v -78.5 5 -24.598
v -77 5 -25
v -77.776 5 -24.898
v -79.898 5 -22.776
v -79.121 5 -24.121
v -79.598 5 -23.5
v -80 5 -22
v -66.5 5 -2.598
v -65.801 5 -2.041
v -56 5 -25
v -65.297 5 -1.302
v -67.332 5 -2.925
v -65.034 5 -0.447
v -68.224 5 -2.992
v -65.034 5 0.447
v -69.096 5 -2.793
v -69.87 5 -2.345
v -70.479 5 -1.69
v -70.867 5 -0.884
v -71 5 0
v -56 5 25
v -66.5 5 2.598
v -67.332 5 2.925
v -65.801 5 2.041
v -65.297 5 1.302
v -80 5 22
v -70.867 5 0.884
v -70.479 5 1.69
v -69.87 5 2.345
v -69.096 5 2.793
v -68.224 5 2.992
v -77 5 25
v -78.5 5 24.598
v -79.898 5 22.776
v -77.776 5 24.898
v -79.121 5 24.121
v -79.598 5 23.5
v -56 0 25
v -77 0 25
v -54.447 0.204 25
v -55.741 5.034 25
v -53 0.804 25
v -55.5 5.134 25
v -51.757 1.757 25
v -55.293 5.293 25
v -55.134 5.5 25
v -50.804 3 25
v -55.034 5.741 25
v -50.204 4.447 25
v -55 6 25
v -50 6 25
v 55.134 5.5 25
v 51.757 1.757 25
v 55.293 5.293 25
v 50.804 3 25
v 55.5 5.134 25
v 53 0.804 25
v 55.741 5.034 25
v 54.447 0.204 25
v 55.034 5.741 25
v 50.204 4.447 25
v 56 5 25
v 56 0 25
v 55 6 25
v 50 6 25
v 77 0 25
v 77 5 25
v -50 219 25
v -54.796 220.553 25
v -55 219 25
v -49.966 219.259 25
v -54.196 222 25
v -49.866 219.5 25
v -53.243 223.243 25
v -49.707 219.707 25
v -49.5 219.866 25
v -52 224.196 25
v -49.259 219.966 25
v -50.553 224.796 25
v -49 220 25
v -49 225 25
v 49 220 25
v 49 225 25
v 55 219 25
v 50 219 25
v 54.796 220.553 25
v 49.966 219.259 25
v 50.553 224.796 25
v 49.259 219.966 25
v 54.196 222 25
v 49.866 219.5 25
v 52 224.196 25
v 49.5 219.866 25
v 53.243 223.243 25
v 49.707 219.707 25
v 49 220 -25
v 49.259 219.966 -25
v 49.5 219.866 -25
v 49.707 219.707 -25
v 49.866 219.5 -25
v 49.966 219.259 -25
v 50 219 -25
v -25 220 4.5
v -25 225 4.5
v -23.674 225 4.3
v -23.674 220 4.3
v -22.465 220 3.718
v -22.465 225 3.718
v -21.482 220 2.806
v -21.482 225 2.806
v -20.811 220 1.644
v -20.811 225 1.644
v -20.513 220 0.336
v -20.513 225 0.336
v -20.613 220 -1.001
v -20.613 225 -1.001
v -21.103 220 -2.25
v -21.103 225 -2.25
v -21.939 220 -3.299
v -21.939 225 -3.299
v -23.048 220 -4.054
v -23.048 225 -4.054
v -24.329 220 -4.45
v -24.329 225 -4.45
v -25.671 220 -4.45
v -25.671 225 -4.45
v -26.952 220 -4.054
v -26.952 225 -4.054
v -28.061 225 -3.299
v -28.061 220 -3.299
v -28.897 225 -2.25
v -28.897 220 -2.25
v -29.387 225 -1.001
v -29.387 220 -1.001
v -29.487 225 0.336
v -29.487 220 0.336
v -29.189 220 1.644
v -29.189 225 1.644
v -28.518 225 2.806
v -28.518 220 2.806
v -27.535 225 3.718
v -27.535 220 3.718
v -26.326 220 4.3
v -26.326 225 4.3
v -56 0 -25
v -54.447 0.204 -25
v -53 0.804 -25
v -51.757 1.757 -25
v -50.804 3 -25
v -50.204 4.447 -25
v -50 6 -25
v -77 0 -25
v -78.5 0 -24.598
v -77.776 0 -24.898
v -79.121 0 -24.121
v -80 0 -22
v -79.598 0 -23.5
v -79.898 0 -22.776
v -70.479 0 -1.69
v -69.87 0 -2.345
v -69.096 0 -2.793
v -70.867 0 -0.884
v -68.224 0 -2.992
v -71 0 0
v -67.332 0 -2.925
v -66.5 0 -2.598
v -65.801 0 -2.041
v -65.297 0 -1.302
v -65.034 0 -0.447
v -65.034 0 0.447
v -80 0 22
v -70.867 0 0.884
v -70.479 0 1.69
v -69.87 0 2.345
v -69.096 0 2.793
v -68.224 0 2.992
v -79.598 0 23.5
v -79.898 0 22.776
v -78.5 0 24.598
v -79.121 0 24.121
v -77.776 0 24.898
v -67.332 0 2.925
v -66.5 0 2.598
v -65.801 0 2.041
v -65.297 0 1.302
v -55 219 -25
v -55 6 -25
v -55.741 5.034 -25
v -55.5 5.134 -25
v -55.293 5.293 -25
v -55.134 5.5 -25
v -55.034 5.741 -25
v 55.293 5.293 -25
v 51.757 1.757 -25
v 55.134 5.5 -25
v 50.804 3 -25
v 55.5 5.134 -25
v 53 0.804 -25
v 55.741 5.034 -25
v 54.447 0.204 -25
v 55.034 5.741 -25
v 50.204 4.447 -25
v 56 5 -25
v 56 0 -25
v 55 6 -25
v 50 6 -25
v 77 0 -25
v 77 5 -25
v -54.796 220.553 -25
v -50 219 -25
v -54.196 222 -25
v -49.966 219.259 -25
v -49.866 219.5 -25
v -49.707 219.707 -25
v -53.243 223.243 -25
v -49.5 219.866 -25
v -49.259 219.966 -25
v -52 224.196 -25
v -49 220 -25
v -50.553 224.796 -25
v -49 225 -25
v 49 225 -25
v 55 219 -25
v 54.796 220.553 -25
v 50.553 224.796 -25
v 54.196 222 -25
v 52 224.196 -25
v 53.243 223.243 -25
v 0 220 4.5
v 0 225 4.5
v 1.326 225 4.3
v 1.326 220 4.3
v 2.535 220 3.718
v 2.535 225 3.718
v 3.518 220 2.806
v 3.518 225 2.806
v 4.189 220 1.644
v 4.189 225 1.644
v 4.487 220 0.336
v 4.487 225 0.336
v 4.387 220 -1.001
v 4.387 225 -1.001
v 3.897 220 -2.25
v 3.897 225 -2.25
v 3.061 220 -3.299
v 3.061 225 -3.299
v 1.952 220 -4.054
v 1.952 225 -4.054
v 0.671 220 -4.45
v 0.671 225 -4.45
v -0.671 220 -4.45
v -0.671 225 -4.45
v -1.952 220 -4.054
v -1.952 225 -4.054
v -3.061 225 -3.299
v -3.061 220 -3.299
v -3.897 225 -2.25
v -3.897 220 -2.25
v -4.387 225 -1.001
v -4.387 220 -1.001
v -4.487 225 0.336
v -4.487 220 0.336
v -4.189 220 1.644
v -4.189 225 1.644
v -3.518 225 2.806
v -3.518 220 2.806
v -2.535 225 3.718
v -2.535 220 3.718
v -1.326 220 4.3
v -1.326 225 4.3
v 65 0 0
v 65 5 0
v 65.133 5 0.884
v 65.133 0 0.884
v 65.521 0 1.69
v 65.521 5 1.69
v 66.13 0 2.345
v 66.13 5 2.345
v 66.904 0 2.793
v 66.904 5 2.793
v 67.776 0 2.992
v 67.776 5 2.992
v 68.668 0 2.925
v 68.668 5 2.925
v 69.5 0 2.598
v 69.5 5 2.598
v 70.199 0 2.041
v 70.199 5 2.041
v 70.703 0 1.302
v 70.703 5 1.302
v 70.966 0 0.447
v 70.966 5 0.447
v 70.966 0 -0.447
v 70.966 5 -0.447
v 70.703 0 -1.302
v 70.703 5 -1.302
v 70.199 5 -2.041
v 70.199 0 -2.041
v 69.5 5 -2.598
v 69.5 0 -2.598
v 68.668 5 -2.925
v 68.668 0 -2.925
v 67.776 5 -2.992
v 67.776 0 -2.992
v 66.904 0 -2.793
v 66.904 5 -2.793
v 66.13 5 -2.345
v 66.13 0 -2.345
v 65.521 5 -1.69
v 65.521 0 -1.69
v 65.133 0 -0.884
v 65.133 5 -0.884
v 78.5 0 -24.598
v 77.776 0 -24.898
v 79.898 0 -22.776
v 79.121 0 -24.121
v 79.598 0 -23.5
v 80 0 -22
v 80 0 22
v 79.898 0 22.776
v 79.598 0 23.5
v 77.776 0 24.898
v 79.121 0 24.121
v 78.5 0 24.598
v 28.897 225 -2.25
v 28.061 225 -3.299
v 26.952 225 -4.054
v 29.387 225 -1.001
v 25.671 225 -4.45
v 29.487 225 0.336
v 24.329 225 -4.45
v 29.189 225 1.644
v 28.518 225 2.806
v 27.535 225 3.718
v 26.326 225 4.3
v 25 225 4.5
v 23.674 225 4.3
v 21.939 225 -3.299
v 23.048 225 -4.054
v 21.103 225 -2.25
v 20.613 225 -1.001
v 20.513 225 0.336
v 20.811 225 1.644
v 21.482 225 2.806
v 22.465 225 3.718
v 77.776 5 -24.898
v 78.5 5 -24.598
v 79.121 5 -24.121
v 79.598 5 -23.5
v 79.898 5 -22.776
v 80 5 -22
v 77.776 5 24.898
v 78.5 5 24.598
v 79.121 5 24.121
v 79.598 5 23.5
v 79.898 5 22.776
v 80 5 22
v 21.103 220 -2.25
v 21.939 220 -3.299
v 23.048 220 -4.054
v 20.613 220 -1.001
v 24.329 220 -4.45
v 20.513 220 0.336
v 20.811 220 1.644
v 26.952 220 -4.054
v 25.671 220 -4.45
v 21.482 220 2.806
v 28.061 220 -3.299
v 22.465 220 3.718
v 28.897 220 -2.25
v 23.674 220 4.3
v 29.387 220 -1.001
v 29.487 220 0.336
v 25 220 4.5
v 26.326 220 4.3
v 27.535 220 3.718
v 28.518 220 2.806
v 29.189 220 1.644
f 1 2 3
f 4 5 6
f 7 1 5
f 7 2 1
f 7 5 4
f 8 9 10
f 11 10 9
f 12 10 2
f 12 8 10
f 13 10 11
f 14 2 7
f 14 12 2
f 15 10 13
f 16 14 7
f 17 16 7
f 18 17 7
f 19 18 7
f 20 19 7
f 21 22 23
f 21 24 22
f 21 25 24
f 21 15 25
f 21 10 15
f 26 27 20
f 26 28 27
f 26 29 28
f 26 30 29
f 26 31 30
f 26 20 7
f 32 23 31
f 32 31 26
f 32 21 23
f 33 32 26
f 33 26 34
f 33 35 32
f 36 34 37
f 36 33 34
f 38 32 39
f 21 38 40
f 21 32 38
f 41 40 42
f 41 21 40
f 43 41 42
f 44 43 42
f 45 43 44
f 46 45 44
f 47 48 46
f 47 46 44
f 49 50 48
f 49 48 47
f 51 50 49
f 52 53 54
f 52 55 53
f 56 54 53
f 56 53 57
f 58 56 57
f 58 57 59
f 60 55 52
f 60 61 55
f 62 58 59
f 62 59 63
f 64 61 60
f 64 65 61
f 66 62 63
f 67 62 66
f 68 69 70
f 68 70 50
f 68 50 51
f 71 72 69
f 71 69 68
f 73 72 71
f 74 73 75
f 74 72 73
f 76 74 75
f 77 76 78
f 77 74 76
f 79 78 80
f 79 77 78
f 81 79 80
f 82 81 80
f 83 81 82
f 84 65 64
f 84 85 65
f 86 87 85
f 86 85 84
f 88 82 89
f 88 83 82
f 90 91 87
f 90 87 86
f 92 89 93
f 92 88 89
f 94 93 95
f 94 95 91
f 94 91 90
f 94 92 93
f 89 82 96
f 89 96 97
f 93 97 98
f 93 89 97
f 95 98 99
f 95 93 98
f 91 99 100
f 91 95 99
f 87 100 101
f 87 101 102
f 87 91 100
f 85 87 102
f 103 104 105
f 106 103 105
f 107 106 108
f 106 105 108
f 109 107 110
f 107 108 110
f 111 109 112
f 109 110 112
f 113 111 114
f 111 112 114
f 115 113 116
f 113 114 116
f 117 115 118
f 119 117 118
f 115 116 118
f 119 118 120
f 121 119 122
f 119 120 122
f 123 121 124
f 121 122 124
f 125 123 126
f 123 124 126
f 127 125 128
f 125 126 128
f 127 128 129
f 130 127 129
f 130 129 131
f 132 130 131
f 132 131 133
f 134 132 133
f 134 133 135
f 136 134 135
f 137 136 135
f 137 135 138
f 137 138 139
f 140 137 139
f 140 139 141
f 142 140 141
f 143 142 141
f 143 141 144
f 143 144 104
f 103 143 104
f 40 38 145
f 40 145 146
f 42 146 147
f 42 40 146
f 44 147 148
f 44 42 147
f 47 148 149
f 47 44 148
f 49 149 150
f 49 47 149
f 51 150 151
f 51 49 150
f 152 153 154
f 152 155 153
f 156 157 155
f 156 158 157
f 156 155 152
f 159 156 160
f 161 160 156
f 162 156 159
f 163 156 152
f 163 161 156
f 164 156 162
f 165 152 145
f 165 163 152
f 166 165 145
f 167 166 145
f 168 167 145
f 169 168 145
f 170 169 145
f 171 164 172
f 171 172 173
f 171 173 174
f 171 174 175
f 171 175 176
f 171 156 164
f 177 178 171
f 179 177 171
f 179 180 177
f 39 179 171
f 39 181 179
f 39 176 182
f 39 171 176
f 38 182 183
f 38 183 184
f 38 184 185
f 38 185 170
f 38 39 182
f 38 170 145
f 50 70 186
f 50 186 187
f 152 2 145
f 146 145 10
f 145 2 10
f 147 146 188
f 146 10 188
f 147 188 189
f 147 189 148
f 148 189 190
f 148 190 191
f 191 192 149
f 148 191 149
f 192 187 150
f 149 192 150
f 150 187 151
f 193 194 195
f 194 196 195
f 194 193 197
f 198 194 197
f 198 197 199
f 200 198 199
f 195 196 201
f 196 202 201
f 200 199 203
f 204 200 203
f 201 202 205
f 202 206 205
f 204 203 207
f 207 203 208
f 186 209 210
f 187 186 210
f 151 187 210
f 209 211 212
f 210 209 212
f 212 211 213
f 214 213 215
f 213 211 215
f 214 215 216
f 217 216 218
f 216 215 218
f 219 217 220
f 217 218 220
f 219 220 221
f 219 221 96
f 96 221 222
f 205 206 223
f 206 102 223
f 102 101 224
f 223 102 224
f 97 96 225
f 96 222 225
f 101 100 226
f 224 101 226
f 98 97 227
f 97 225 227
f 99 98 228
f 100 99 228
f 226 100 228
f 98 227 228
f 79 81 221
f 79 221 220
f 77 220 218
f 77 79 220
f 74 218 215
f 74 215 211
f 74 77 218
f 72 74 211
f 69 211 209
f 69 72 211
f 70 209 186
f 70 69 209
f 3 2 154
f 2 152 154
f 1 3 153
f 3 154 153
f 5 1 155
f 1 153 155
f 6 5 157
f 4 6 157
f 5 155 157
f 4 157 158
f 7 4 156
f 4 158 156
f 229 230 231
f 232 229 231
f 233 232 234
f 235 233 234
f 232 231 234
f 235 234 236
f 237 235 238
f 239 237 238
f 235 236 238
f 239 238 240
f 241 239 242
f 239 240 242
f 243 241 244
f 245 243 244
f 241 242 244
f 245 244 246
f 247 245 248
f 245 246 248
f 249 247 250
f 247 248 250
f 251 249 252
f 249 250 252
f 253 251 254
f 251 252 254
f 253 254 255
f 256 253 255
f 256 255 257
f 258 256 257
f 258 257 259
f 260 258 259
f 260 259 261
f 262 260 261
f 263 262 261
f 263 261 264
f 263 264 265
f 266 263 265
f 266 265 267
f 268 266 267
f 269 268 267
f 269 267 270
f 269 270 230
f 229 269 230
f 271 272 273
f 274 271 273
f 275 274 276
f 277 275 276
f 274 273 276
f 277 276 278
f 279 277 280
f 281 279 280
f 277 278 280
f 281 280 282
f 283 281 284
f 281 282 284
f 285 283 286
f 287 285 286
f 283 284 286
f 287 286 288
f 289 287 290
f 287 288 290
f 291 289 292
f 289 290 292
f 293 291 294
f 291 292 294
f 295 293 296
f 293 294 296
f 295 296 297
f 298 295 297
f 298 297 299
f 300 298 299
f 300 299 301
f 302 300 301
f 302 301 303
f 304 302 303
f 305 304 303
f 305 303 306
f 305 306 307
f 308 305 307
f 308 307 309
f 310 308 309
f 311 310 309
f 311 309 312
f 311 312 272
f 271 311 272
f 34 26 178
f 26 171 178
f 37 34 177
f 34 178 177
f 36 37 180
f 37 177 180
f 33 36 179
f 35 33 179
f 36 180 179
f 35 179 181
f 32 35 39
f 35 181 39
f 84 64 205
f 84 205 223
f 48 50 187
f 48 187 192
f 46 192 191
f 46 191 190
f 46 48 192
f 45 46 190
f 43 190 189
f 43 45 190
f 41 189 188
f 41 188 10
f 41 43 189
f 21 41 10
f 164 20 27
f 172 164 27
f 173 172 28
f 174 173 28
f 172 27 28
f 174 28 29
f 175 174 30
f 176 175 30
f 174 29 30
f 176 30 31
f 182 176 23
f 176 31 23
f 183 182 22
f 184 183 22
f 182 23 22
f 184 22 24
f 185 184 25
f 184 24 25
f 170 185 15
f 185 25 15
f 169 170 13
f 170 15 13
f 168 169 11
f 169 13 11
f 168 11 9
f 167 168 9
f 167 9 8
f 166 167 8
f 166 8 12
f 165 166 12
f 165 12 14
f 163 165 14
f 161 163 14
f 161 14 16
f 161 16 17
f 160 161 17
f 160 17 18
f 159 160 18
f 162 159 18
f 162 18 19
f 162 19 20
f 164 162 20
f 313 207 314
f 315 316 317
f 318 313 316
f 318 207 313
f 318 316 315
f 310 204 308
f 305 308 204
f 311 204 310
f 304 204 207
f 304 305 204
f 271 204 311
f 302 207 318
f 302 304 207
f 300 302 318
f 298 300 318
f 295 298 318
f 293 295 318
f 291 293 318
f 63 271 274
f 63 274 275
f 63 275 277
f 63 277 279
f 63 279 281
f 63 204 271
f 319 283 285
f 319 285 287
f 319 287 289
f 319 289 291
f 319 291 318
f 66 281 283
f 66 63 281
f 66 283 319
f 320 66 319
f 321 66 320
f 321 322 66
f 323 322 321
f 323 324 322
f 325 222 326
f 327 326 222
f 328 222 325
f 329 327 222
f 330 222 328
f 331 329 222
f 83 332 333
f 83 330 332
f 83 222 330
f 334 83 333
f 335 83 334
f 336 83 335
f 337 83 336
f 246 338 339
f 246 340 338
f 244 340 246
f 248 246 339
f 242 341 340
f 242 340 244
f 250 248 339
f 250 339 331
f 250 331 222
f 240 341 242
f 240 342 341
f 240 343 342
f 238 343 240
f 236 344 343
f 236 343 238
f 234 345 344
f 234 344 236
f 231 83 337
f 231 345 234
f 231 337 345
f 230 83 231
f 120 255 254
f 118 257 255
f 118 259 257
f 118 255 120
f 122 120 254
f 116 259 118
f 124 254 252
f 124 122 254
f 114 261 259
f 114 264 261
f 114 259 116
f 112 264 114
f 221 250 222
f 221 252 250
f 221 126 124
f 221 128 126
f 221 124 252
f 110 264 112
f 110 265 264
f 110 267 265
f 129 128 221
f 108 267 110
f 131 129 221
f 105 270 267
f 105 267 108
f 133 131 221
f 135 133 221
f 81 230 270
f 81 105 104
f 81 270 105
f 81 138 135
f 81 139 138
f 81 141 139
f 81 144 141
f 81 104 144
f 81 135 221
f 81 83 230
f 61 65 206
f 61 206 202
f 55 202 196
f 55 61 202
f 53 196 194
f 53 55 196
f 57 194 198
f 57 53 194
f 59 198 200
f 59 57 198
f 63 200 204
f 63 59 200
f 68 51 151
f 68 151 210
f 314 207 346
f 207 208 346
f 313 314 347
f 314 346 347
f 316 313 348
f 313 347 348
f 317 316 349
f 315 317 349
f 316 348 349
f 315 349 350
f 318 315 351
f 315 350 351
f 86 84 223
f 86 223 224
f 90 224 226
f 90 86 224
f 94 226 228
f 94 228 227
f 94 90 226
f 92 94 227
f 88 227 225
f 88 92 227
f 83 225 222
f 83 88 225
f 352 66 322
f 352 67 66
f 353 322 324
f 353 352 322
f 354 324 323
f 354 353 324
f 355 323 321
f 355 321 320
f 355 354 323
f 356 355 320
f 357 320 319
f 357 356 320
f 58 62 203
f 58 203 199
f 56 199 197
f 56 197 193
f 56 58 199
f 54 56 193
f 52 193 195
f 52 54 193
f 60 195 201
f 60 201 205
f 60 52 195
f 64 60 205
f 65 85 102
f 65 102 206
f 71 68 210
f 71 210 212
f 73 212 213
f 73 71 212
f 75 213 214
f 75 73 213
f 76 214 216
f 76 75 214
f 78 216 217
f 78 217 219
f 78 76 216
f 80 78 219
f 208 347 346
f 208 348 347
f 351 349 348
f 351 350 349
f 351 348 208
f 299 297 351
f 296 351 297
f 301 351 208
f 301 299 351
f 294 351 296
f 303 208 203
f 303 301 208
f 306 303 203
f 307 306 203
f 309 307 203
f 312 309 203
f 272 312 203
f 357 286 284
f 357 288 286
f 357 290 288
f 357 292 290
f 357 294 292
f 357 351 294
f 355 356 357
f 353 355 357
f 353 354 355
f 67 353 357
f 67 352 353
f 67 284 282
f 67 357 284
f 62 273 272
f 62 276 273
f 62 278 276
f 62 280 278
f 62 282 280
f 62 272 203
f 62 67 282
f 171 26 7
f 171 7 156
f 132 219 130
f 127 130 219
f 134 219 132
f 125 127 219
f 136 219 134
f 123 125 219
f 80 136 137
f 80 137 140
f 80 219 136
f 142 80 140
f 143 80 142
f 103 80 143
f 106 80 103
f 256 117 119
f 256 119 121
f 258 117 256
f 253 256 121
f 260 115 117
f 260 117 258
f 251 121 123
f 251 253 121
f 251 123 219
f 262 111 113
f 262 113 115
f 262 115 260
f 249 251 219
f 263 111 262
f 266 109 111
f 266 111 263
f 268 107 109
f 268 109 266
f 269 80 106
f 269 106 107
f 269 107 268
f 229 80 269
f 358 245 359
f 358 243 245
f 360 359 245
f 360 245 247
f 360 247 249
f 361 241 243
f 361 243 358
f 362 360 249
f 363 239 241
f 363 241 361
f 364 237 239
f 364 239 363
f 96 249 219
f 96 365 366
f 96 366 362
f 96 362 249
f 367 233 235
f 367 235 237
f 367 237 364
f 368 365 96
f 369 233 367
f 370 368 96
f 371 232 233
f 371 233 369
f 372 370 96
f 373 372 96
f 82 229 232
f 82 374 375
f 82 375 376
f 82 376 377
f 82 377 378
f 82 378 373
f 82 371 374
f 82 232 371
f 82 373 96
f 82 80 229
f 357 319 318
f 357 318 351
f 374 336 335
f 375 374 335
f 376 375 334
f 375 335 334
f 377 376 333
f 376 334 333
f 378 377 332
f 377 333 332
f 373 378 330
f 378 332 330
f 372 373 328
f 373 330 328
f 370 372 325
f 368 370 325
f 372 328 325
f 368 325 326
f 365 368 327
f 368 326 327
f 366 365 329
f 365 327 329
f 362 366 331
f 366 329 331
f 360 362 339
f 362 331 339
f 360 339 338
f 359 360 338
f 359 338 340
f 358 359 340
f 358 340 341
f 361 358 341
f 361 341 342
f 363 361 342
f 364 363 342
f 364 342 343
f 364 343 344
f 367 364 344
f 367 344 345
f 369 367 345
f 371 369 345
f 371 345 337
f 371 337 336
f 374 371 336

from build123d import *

# Parameters (mm, degrees)
BASE_FLANGE1_DEPTH = 25
CUT_EXTRUDE1_REACH = 237.425
SKETCH7_R          = 3
CUT_EXTRUDE2_REACH = 242.104
SKETCH8_R          = 4.5
FILLET1_R          = 3


# Sheet-metal steps are written as plain solids
with BuildPart() as part:
    # Sketch1 → Base-Flange1 (new, symmetric)
    with BuildSketch(Plane.XY):
        with BuildLine():
            Line((-80, 0), (-56, 0))
            ThreePointArc((-56, 0), (-51.757359313, 1.757359313), (-50, 6))
            Line((-50, 6), (-50, 219))
            ThreePointArc((-50, 219), (-49.707106781, 219.707106781), (-49, 220))
            Line((-49, 220), (49, 220))
            ThreePointArc((49, 220), (49.707106781, 219.707106781), (50, 219))
            Line((50, 219), (50, 6))
            ThreePointArc((50, 6), (51.757359313, 1.757359313), (56, 0))
            Line((56, 0), (80, 0))
            Line((80, 0), (80, 5))
            Line((80, 5), (56, 5))
            ThreePointArc((56, 5), (55.292893219, 5.292893219), (55, 6))
            Line((55, 6), (55, 219))
            ThreePointArc((55, 219), (53.242640687, 223.242640687), (49, 225))
            Line((49, 225), (-49, 225))
            ThreePointArc((-49, 225), (-53.242640687, 223.242640687), (-55, 219))
            Line((-55, 219), (-55, 6))
            ThreePointArc((-55, 6), (-55.292893219, 5.292893219), (-56, 5))
            Line((-56, 5), (-80, 5))
            Line((-80, 5), (-80, 0))
        make_face()
    extrude(amount=BASE_FLANGE1_DEPTH, both=True)

    # Sketch7 → Cut-Extrude1 (cut, up to next)
    with BuildSketch(Plane(origin=(0, 5, 0), x_dir=(1, 0, 0), z_dir=(0, 1, 0)), mode=Mode.PRIVATE) as cut_extrude1_sk1:
        with Locations(Location((68, 0, 0), (0, 0, 180))):
            Circle(SKETCH7_R)
    cut_extrude1_tool1 = extrude(cut_extrude1_sk1.sketch, amount=-CUT_EXTRUDE1_REACH, mode=Mode.PRIVATE) & part.part
    # Sketch7 → Cut-Extrude1 (cut, up to next)
    with BuildSketch(Plane(origin=(0, 5, 0), x_dir=(1, 0, 0), z_dir=(0, 1, 0)), mode=Mode.PRIVATE) as cut_extrude1_sk2:
        with Locations(Location((-68, 0, 0), (0, 0, 180))):
            Circle(SKETCH7_R)
    cut_extrude1_tool2 = extrude(cut_extrude1_sk2.sketch, amount=-CUT_EXTRUDE1_REACH, mode=Mode.PRIVATE) & part.part
    add(cut_extrude1_tool1.solids().sort_by_distance((68, 5, 0))[0], mode=Mode.SUBTRACT)
    add(cut_extrude1_tool2.solids().sort_by_distance((-68, 5, 0))[0], mode=Mode.SUBTRACT)

    # Sketch8 → Cut-Extrude2 (cut, up to next)
    with BuildSketch(Plane(origin=(0, 225, 0), x_dir=(1, 0, 0), z_dir=(0, 1, 0)), mode=Mode.PRIVATE) as cut_extrude2_sk1:
        with Locations(Location((0, 0, 0), (0, 0, 270))):
            Circle(SKETCH8_R)
    cut_extrude2_tool1 = extrude(cut_extrude2_sk1.sketch, amount=-CUT_EXTRUDE2_REACH, mode=Mode.PRIVATE) & part.part
    # Sketch8 → Cut-Extrude2 (cut, up to next)
    with BuildSketch(Plane(origin=(0, 225, 0), x_dir=(1, 0, 0), z_dir=(0, 1, 0)), mode=Mode.PRIVATE) as cut_extrude2_sk2:
        with Locations(Location((-25, 0, 0), (0, 0, 270))):
            Circle(SKETCH8_R)
    cut_extrude2_tool2 = extrude(cut_extrude2_sk2.sketch, amount=-CUT_EXTRUDE2_REACH, mode=Mode.PRIVATE) & part.part
    # Sketch8 → Cut-Extrude2 (cut, up to next)
    with BuildSketch(Plane(origin=(0, 225, 0), x_dir=(1, 0, 0), z_dir=(0, 1, 0)), mode=Mode.PRIVATE) as cut_extrude2_sk3:
        with Locations(Location((25, 0, 0), (0, 0, 270))):
            Circle(SKETCH8_R)
    cut_extrude2_tool3 = extrude(cut_extrude2_sk3.sketch, amount=-CUT_EXTRUDE2_REACH, mode=Mode.PRIVATE) & part.part
    add(cut_extrude2_tool1.solids().sort_by_distance((0, 225, 0))[0], mode=Mode.SUBTRACT)
    add(cut_extrude2_tool2.solids().sort_by_distance((-25, 225, 0))[0], mode=Mode.SUBTRACT)
    add(cut_extrude2_tool3.solids().sort_by_distance((25, 225, 0))[0], mode=Mode.SUBTRACT)

    # Fillet1
    fillet1_edges = [part.edges().sort_by_distance(p)[0] for p in [
        (80, 2.5, -25),
        (-80, 2.5, -25),
        (80, 2.5, 25),
        (-80, 2.5, 25),
    ]]
    fillet(fillet1_edges, radius=FILLET1_R)


solid = part.part
